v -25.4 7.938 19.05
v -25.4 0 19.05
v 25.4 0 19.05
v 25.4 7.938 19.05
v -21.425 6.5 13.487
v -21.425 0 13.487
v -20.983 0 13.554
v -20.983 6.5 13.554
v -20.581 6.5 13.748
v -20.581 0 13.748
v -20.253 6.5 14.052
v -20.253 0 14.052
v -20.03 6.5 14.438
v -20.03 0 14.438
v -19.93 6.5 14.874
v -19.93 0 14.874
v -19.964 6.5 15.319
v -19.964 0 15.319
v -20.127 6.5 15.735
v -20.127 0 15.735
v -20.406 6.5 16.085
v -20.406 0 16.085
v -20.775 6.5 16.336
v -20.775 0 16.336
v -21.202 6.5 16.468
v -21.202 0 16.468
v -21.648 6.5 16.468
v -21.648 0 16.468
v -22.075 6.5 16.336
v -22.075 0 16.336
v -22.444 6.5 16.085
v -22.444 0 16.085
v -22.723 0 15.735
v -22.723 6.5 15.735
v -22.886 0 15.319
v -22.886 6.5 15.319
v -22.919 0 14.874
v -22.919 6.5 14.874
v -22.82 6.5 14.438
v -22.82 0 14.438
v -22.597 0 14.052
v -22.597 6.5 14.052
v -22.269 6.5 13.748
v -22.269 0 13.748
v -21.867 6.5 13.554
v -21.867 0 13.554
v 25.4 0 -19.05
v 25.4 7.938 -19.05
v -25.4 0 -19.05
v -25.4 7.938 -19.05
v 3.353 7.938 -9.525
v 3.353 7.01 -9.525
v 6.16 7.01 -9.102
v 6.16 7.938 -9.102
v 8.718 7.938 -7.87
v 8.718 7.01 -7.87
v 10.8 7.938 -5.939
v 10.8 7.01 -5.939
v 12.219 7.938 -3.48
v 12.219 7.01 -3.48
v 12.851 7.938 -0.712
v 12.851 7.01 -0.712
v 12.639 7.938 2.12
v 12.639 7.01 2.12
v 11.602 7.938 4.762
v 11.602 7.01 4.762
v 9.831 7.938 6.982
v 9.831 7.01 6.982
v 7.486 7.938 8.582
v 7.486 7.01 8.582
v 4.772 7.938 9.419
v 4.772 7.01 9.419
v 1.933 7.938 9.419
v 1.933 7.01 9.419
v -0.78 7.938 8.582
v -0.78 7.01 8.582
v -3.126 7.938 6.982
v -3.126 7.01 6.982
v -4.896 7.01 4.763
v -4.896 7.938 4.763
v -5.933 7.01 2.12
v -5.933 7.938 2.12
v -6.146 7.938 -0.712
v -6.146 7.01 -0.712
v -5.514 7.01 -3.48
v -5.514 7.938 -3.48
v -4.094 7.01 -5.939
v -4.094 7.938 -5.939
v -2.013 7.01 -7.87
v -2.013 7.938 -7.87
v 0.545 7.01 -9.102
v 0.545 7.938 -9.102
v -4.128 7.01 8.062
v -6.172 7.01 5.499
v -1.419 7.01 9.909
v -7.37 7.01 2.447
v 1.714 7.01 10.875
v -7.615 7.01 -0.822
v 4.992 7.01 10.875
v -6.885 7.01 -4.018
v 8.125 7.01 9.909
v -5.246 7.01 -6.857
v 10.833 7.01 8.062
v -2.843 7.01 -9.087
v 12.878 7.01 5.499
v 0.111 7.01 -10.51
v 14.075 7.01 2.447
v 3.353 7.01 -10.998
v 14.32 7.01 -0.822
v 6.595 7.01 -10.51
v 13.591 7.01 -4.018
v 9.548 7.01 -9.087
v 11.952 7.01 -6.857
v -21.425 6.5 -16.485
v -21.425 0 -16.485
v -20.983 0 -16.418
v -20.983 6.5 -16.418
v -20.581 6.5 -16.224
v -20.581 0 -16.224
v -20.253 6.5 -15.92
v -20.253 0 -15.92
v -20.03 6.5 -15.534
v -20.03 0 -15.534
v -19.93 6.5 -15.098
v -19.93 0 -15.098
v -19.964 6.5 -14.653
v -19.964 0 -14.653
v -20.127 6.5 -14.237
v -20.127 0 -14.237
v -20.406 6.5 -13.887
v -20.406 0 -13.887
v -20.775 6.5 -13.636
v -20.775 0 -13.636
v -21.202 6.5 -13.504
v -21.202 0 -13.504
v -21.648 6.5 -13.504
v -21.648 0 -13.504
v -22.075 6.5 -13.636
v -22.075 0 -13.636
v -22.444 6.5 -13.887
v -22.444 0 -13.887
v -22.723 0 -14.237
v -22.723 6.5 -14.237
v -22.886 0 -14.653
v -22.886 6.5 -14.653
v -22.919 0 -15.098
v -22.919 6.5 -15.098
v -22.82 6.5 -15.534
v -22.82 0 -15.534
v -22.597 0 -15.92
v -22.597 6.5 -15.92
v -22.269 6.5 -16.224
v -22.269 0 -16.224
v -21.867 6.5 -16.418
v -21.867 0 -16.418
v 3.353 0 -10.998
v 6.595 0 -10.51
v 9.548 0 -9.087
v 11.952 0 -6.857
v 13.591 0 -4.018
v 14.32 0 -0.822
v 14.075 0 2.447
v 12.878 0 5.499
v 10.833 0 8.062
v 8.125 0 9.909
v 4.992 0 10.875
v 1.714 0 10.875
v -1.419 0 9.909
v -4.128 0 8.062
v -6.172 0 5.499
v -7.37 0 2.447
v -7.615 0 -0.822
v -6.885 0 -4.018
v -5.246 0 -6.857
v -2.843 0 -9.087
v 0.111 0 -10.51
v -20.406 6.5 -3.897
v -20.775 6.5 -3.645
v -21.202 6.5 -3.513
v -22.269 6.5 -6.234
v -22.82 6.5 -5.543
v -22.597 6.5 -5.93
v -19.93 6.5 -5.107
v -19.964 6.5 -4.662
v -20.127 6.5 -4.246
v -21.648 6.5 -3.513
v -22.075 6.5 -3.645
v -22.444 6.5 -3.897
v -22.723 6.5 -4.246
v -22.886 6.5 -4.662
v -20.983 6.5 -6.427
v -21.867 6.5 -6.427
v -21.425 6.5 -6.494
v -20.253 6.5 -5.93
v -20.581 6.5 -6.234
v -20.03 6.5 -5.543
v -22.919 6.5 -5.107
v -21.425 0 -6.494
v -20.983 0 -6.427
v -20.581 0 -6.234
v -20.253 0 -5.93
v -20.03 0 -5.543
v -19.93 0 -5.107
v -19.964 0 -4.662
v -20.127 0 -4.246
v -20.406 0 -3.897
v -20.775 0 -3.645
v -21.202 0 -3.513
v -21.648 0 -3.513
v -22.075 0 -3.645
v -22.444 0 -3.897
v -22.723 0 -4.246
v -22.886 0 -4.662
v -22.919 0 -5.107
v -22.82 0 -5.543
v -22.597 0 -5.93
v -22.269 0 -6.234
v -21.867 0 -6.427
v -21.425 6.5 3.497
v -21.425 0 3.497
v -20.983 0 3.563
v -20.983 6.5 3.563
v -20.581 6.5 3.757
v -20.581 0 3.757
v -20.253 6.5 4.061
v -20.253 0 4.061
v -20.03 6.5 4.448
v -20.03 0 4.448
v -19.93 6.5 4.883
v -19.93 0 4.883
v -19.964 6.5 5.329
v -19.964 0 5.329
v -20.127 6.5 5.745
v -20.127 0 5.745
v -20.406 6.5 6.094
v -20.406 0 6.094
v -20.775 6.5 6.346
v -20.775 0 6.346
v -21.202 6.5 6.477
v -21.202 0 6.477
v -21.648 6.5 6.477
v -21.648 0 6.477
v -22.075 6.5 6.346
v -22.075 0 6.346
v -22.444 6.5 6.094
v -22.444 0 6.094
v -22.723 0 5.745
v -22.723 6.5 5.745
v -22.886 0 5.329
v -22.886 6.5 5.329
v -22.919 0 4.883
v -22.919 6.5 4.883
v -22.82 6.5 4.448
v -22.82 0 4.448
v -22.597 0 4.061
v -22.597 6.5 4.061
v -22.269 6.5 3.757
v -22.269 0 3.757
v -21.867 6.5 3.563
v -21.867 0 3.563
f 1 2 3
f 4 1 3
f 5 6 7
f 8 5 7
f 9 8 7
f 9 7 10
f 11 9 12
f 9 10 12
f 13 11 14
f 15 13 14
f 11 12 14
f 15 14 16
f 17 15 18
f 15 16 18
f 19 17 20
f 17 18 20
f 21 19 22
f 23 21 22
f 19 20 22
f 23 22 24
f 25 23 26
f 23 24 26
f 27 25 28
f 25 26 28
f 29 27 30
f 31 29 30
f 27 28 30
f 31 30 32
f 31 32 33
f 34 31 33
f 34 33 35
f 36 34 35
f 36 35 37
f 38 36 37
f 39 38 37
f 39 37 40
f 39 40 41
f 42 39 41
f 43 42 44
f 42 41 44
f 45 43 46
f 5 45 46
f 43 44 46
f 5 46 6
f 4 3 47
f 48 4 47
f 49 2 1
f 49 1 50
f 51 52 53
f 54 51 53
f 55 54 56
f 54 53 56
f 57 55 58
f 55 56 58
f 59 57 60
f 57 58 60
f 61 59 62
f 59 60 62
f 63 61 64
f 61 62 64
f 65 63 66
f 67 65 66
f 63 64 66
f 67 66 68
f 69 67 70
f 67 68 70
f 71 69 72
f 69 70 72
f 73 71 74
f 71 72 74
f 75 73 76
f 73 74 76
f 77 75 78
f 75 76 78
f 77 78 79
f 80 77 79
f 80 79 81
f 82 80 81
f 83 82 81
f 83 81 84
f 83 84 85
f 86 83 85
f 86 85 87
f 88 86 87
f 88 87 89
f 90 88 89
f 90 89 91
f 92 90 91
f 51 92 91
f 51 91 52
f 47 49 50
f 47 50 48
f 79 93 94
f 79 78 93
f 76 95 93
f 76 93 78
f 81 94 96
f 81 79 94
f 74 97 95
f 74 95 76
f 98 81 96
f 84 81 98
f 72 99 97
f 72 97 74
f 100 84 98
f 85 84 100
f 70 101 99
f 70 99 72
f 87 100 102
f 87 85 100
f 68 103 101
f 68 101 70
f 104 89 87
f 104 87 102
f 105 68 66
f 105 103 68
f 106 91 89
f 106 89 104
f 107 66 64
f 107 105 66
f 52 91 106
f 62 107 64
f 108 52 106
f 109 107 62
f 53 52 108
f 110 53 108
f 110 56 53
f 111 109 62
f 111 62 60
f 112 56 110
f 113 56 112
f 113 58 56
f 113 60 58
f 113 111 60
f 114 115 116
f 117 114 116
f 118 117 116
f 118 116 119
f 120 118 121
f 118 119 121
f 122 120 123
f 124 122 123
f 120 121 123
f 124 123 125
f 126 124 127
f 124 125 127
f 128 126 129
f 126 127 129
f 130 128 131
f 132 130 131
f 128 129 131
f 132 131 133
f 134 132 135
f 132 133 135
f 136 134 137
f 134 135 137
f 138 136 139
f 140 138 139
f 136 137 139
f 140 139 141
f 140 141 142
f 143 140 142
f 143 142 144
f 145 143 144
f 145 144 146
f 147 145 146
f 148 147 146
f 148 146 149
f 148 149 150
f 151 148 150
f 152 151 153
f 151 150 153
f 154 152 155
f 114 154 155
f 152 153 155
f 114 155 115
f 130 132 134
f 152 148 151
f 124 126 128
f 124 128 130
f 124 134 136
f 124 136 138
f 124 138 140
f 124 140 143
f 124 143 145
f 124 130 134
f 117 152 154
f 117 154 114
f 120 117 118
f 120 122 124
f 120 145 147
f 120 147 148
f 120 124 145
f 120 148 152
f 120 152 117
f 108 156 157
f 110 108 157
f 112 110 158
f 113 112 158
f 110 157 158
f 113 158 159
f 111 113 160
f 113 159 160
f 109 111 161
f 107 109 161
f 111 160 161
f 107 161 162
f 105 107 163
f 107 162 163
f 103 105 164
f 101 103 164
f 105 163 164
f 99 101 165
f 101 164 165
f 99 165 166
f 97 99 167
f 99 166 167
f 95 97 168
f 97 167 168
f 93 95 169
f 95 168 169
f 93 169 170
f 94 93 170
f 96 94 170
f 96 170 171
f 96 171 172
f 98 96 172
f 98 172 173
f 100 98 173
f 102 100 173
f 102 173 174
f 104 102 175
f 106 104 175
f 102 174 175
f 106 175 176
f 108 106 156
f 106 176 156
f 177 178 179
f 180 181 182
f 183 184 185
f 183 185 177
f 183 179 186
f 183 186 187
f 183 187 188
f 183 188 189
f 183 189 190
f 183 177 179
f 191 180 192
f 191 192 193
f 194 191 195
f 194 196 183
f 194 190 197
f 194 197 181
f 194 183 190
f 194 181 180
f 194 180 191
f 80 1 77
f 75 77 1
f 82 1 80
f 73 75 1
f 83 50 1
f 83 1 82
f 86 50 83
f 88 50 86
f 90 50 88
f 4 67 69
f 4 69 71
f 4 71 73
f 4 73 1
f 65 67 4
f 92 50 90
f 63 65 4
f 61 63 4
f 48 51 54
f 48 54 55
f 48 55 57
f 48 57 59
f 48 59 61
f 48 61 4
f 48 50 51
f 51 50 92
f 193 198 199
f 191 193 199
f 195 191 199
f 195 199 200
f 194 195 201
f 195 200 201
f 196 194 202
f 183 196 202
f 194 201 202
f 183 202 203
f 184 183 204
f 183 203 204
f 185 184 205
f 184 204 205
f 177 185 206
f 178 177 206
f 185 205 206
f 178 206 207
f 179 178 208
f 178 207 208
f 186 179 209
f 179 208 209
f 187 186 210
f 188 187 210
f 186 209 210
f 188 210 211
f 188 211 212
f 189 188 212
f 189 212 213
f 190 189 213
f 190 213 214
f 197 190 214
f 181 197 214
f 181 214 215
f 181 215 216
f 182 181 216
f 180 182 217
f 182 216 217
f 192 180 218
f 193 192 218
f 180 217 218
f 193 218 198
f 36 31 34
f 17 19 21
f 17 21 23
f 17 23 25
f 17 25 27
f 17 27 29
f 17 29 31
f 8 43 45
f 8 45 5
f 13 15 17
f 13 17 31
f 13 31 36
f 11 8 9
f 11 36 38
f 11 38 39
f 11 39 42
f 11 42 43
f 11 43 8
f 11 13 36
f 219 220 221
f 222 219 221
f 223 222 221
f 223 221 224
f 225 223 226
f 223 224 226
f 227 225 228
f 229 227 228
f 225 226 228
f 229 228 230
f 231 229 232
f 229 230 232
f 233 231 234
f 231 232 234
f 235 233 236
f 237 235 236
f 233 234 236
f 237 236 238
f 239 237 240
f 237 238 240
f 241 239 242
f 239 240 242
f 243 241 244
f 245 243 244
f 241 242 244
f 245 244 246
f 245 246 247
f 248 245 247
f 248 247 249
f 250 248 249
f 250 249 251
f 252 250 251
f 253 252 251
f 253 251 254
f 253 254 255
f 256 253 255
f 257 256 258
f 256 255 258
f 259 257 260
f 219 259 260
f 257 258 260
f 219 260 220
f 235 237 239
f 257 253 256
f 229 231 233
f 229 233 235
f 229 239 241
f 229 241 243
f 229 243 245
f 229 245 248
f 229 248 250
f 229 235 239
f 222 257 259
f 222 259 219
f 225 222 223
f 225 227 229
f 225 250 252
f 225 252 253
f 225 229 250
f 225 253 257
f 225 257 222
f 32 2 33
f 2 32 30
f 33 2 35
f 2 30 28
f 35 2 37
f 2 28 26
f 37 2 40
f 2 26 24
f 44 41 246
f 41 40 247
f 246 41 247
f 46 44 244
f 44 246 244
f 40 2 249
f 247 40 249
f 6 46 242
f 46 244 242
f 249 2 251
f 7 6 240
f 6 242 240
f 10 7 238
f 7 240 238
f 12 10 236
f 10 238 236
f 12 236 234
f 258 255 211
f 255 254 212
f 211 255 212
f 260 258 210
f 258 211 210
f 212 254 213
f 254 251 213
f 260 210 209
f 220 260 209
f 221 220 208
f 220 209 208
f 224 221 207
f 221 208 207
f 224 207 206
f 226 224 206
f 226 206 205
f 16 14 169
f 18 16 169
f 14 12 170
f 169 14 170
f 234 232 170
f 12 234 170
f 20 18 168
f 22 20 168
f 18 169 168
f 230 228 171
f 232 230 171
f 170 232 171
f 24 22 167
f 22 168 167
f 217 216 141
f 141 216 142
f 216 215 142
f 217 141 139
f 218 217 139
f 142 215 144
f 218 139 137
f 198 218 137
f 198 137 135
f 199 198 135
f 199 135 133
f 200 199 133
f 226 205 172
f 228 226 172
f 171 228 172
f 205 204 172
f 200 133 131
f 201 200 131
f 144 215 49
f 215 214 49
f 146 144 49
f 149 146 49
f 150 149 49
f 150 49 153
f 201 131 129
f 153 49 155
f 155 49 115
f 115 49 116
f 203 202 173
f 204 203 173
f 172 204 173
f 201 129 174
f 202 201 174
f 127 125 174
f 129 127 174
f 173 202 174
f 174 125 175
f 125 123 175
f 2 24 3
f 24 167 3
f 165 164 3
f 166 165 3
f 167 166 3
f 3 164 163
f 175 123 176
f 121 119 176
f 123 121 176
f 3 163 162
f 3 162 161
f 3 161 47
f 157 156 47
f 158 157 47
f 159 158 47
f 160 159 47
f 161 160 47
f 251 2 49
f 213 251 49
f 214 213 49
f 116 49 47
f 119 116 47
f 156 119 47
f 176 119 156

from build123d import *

# Parameters (mm, degrees)
SKETCH1_W          = 50.8
SKETCH1_H          = 38.1
BODY_DEPTH         = 7.9375
SKETCH_1_R         = 9.525
THRU_HOLE_DEPTH    = 33.727150903
SKETCH4_R          = 10.9982
BEARING_BORE_DEPTH = 7.0104
SKETCH5_R          = 1.4986
DOWEL_HOLES_DEPTH  = 6.5


with BuildPart() as part:
    # Sketch1 → Body (new body)
    with BuildSketch(Plane(origin=(0, 0, 0), x_dir=(1, 0, 0), z_dir=(0, 1, 0))):
        Rectangle(SKETCH1_W, SKETCH1_H)
    extrude(amount=BODY_DEPTH)

    # Sketch 1 → Thru Hole (cut, through all)
    with BuildSketch(Plane.XZ):
        with Locations(Location((3.3528, 0, 0), (0, 0, 270))):
            Circle(SKETCH_1_R)
    extrude(amount=-THRU_HOLE_DEPTH, mode=Mode.SUBTRACT)

    # Sketch4 → Bearing Bore (cut)
    with BuildSketch(Plane.XZ):
        with Locations(Location((3.3528, 0, 0), (0, 0, 270))):
            Circle(SKETCH4_R)
    extrude(amount=-BEARING_BORE_DEPTH, mode=Mode.SUBTRACT)

    # Sketch5 → Dowel Holes (cut)
    with BuildSketch(Plane.XZ):
        with Locations(Location((-21.4249, 14.986, 0), (0, 0, 270))):
            Circle(SKETCH5_R)
        with Locations(Location((-21.4249, 4.995333333, 0), (0, 0, 270))):
            Circle(SKETCH5_R)
        with Locations(Location((-21.4249, -14.986, 0), (0, 0, 270))):
            Circle(SKETCH5_R)
        with Locations(Location((-21.4249, -4.995333333, 0), (0, 0, 270))):
            Circle(SKETCH5_R)
    extrude(amount=-DOWEL_HOLES_DEPTH, mode=Mode.SUBTRACT)


solid = part.part
